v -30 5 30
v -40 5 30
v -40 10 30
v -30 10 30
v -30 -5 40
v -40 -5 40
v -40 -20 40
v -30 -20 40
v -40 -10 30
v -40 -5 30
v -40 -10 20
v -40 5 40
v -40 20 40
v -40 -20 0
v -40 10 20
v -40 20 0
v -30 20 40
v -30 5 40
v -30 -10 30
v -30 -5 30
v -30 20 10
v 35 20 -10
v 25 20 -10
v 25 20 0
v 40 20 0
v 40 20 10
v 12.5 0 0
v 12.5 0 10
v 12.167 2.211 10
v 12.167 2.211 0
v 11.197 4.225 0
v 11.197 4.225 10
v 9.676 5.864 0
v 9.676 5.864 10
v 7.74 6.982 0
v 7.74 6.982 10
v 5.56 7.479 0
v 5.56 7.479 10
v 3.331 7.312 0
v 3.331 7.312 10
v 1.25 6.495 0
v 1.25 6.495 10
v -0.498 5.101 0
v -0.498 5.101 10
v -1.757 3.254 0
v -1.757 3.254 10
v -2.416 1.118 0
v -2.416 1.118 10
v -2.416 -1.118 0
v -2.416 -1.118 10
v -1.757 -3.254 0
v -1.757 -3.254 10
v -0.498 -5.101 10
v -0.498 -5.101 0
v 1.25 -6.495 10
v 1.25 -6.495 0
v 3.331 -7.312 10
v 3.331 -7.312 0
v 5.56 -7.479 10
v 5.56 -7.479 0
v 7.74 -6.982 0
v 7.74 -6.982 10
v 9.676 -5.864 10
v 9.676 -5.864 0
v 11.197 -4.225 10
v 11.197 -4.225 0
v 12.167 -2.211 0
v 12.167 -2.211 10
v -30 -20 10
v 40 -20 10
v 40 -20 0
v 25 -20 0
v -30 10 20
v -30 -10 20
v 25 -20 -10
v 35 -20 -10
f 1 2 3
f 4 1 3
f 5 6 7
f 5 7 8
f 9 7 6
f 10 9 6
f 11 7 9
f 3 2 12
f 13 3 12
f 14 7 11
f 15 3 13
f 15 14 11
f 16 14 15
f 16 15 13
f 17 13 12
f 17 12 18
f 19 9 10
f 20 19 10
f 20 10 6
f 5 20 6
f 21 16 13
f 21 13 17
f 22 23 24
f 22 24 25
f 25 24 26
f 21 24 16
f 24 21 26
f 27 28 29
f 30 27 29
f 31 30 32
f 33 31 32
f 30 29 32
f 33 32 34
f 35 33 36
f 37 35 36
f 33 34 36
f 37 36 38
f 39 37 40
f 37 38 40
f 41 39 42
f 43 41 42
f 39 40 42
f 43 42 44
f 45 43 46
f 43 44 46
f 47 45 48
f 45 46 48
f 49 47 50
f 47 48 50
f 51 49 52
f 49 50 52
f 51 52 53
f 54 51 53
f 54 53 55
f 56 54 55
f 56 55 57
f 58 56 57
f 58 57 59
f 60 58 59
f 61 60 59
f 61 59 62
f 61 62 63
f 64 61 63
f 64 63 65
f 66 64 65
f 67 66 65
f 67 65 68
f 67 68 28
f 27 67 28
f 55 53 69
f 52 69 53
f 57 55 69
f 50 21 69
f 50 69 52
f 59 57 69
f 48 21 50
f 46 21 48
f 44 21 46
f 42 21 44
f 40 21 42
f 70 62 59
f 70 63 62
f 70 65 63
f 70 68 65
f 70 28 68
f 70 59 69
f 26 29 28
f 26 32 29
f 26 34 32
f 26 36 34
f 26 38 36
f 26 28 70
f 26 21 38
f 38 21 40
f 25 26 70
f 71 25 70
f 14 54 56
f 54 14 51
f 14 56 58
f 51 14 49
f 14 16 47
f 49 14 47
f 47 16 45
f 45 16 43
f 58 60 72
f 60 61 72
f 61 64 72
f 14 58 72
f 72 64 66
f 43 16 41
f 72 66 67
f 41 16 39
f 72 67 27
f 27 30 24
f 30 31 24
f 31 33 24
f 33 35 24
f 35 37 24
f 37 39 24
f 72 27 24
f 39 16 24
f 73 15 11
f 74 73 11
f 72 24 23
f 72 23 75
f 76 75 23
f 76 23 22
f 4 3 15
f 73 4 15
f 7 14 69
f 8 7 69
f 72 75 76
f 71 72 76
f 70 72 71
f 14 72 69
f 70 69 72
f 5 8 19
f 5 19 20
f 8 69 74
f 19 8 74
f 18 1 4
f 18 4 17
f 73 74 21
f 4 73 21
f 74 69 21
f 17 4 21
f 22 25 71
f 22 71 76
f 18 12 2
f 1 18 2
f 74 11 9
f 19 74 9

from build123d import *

# Parameters (mm, degrees)
F0_W      = 80
F0_H      = 40
F1_DEPTH  = 10
F2_W      = 10
F2_H      = 40
F3_DEPTH  = 30
F4_W      = 15
F4_H      = 40
F5_DEPTH  = 10
F7_DEPTH  = 40.001
F9_DEPTH  = 80.001
F10_R     = 7.5
F11_DEPTH = 20.001


with BuildPart() as f1:
    # F0 (on Top) → F1 (new body)
    with BuildSketch(Plane.XY):
        Rectangle(F0_W, F0_H)
    extrude(amount=F1_DEPTH)

    # F2 (on face) → F3 (join)
    with BuildSketch(Plane.XY.offset(10)):
        with Locations((-35, 0)):
            Rectangle(F2_W, F2_H)
    extrude(amount=F3_DEPTH)

    # F4 (on face) → F5 (join)
    with BuildSketch(Plane(origin=(0, 0, 0), x_dir=(1, 0, 0), z_dir=(0, 0, -1))):
        with Locations((32.5, 0)):
            Rectangle(F4_W, F4_H)
    extrude(amount=F5_DEPTH)

    # F6 (on face) → F7 (cut, through all)
    with BuildSketch(Plane.XZ.offset(20)):
        Polygon((40, 0), (35, -10), (40, -10), align=None)
    extrude(amount=-F7_DEPTH, mode=Mode.SUBTRACT)

    # F8 (on face) → F9 (cut, through all)
    with BuildSketch(Plane(origin=(-40, 0, 0), x_dir=(0, -1, 0), z_dir=(-1, 0, 0))):
        Polygon((5, 40), (-5, 40), (-5, 30), (-10, 30), (-10, 20), (10, 20), (10, 30), (5, 30), align=None)
    extrude(amount=-F9_DEPTH, mode=Mode.SUBTRACT)

    # F10 (on face) → F11 (cut, through all)
    with BuildSketch(Plane.XY.offset(10)):
        with Locations((5, 0)):
            Circle(F10_R)
    extrude(amount=-F11_DEPTH, mode=Mode.SUBTRACT)


solid = f1.part
